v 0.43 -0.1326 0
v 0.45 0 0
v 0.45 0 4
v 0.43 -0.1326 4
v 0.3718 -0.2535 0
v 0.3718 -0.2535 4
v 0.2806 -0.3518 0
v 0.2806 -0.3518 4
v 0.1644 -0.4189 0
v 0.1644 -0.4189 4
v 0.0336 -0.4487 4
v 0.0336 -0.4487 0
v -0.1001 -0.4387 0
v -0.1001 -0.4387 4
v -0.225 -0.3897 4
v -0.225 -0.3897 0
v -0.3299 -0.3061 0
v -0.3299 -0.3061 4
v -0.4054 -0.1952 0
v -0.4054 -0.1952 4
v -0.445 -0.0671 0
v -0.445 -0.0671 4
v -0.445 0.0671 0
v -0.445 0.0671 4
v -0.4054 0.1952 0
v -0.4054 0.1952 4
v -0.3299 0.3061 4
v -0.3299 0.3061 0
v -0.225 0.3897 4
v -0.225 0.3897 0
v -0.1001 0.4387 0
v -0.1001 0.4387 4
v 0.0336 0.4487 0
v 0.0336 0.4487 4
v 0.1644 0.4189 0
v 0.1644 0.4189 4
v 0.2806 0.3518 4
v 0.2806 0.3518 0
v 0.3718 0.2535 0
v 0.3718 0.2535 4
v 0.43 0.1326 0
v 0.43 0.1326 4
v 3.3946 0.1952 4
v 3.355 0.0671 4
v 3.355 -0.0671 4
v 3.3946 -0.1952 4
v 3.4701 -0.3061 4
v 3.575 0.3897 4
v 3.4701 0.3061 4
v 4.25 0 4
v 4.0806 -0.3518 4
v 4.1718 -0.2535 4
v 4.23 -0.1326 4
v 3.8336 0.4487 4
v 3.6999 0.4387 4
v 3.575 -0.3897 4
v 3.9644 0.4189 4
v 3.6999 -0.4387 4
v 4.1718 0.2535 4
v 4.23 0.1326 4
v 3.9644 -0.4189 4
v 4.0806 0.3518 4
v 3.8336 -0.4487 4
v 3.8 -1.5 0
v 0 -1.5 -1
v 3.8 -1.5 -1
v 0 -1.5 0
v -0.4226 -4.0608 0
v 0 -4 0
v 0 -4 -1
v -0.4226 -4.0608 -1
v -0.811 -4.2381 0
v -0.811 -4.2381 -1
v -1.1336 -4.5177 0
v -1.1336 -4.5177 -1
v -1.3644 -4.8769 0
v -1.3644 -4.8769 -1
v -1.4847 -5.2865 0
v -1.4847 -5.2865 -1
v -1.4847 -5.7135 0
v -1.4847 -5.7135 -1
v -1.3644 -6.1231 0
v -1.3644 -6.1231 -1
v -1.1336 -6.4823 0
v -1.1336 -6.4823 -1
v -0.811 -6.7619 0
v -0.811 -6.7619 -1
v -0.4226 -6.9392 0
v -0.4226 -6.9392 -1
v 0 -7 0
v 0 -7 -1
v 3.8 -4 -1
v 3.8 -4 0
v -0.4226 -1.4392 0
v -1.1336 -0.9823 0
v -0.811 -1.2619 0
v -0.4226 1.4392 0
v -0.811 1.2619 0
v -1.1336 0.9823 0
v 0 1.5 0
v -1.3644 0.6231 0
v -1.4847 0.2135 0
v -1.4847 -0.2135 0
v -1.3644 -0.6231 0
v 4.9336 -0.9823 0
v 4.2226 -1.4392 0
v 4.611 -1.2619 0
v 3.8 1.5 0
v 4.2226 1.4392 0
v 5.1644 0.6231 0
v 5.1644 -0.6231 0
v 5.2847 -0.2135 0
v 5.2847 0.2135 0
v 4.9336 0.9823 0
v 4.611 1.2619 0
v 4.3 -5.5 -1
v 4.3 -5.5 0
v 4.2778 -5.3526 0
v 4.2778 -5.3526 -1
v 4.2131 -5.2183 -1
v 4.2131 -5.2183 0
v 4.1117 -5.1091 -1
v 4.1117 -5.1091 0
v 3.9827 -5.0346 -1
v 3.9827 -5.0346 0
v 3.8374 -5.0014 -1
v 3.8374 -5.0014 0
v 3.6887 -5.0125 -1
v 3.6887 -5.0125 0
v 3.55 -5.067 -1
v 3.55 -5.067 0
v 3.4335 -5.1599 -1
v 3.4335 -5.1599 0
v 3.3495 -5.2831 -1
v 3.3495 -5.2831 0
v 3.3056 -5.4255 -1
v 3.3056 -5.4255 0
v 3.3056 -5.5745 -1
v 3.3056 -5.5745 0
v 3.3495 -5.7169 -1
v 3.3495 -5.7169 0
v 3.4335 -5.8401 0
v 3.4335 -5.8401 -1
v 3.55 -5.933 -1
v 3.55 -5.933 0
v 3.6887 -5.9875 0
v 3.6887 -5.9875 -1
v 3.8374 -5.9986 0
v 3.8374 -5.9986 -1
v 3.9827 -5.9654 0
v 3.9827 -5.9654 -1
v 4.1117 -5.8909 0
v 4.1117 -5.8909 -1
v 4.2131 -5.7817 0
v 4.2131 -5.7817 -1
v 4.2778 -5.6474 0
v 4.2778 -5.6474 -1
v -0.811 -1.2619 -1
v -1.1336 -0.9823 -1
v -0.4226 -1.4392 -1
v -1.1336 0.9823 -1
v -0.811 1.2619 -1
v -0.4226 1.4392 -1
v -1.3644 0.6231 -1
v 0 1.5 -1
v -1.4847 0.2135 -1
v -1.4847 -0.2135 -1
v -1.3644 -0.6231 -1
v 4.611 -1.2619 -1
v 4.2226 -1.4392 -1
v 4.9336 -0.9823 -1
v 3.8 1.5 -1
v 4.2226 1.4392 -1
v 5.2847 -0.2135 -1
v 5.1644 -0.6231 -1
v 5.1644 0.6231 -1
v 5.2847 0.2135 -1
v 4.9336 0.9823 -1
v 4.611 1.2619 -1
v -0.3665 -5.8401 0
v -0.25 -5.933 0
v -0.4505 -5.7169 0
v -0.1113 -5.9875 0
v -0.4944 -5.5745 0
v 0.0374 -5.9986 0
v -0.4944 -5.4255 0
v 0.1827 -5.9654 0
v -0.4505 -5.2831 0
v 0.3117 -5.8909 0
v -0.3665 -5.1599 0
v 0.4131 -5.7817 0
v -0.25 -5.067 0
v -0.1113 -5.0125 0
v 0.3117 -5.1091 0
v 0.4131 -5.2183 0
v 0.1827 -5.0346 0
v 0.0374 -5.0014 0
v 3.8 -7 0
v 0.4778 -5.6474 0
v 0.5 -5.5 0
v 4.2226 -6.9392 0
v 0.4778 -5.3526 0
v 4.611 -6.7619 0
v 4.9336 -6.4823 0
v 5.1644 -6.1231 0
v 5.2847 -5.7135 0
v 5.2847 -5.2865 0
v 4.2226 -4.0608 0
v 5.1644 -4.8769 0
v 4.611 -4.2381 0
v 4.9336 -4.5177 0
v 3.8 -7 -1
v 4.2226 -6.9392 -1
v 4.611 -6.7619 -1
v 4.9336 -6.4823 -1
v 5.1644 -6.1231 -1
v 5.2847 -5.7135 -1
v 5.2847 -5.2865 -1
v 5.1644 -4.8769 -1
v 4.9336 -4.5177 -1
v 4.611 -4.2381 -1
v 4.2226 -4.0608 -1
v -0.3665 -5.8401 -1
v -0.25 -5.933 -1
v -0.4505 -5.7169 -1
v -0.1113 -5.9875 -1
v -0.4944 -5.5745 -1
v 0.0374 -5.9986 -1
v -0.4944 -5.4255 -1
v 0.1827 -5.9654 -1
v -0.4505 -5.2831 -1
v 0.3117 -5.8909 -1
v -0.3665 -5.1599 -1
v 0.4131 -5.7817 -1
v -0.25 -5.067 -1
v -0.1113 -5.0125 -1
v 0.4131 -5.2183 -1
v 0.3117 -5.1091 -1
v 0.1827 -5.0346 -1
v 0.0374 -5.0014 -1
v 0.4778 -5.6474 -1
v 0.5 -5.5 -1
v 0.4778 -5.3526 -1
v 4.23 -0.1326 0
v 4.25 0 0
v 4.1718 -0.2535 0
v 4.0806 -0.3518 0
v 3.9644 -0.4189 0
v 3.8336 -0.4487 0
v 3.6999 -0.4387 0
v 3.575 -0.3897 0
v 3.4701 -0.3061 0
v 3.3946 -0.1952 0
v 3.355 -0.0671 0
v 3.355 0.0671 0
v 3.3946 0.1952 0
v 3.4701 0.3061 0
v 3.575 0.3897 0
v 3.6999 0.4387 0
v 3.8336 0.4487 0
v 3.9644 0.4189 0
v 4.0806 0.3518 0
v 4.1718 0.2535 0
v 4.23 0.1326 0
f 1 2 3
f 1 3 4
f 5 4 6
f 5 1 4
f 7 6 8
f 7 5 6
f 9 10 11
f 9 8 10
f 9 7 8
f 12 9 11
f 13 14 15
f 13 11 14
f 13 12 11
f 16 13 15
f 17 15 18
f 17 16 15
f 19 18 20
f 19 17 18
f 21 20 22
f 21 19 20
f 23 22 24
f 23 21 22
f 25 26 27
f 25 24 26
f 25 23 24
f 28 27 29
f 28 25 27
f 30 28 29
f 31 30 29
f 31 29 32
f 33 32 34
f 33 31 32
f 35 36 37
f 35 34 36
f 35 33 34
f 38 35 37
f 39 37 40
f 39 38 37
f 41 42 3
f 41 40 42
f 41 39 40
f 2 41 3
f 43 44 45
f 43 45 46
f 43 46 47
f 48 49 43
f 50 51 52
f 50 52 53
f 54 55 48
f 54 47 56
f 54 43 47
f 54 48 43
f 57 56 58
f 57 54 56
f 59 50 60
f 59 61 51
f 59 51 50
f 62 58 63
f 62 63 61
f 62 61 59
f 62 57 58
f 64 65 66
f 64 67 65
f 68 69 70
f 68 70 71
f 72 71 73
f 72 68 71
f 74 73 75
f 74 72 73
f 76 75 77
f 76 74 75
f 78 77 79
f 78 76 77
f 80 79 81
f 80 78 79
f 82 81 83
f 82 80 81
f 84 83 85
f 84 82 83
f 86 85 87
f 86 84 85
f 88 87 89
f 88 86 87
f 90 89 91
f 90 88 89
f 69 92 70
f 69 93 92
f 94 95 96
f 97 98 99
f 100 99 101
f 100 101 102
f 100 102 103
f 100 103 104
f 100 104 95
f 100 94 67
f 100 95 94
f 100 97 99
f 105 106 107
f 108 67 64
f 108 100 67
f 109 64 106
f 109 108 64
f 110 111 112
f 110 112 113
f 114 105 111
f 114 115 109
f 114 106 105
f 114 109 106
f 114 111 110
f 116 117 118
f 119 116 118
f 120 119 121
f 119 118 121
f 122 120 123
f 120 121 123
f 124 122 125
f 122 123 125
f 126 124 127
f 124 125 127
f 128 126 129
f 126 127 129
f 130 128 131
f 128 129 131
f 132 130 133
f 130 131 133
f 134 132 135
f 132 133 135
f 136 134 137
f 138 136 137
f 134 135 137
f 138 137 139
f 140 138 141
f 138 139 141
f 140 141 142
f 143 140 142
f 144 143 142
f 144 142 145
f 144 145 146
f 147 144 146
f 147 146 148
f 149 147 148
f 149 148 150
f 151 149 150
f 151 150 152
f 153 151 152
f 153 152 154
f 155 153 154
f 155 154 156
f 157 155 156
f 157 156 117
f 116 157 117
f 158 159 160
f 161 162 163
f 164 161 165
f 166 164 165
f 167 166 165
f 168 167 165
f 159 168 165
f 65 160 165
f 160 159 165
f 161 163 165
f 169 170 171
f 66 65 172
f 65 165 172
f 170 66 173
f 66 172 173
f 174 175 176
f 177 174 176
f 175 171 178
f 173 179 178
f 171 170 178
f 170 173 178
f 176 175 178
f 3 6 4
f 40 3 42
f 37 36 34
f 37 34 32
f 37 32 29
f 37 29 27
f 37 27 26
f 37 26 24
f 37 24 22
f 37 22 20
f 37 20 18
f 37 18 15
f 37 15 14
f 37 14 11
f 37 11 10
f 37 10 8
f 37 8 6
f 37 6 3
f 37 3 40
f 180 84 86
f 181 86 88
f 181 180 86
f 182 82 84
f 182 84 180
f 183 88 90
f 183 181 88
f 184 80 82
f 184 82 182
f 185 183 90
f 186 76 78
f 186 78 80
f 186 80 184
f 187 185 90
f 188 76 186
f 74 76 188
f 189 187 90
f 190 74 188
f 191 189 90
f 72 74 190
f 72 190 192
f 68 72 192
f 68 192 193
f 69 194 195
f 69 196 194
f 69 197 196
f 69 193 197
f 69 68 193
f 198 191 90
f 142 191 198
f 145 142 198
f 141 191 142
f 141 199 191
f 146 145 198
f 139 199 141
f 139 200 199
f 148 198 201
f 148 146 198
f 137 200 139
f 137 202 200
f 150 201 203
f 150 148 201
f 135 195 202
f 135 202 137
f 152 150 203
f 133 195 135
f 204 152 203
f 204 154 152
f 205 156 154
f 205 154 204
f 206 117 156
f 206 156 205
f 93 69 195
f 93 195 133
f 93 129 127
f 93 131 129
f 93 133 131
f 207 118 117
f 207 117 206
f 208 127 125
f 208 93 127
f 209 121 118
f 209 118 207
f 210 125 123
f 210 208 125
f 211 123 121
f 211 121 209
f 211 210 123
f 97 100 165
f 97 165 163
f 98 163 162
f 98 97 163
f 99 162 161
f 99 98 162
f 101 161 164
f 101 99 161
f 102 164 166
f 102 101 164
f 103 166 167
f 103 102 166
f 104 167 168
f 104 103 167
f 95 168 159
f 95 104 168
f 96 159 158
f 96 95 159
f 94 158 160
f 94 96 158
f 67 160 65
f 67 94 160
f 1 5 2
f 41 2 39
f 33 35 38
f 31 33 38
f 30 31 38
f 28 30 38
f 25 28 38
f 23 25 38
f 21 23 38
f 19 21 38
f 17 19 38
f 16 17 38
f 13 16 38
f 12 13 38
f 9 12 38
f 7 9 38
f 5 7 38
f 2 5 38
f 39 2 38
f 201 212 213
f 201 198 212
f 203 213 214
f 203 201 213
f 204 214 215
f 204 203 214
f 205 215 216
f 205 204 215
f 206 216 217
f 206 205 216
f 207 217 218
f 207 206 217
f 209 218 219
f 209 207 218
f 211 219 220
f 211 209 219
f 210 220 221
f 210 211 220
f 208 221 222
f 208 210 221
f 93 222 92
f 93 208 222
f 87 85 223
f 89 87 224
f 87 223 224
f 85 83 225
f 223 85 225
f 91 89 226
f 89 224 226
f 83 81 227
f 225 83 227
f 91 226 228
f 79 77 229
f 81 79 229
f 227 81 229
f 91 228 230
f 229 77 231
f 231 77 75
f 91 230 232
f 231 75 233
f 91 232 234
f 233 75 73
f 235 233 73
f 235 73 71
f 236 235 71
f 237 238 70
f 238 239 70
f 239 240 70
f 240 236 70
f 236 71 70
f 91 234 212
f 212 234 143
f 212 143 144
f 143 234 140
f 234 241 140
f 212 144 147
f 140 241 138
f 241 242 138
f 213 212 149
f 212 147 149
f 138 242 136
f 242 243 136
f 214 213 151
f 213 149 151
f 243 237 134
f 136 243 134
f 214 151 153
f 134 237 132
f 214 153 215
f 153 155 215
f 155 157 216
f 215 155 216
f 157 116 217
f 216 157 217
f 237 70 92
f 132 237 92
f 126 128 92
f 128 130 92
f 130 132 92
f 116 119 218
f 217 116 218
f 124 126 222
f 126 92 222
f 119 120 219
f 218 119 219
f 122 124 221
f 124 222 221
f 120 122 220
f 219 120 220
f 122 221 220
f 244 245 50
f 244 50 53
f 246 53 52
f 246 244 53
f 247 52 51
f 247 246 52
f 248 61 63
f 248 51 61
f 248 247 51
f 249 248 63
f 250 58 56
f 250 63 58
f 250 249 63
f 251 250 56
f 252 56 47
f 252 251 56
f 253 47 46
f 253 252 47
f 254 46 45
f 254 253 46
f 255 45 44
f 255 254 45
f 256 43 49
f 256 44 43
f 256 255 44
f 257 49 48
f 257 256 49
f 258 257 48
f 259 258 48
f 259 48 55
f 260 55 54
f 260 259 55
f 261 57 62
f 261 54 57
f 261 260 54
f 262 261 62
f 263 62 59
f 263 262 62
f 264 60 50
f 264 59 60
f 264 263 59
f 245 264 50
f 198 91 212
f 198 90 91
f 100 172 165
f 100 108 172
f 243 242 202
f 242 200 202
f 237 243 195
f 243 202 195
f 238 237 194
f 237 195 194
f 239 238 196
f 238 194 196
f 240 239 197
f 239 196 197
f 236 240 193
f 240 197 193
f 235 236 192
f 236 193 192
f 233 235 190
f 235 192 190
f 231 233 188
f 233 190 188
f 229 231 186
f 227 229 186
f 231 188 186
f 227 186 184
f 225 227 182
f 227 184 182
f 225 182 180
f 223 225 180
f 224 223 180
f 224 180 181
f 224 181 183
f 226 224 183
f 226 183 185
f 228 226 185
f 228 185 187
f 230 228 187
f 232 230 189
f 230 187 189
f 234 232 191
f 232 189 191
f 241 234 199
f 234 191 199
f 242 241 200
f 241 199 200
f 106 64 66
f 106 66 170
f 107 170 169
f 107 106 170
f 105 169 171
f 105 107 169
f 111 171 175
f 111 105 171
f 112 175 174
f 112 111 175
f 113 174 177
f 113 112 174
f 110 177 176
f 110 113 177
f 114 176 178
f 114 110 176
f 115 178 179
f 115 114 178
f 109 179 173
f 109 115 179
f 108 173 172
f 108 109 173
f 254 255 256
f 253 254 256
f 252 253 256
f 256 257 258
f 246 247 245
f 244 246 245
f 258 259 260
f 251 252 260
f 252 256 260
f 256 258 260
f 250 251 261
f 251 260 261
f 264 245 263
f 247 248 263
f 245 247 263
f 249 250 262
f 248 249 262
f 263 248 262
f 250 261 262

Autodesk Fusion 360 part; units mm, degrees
sketch "Sketch1" plane through (0, 0, 0) normal (0, 0, 1) x (1, 0, 0)
  line L0 (0, -1.5) -> (3.8, -1.5)
  arc A0 (3.8, -1.5) -> (3.8, 1.5) centre (3.8, 0) ccw
  line L1 (3.8, 1.5) -> (0, 1.5)
  arc A1 (0, 1.5) -> (0, -1.5) centre (0, 0) ccw
  line L2 (0, 0) -> (3.8, 0) construction
  circle A2 centre (0, 0) radius 0.45
  circle A3 centre (3.8, 0) radius 0.45
  line L3 (0, -7) -> (3.8, -7)
  arc A4 (3.8, -7) -> (3.8, -4) centre (3.8, -5.5) ccw
  line L4 (3.8, -4) -> (0, -4)
  arc A5 (0, -4) -> (0, -7) centre (0, -5.5) ccw
  line L5 (0, -5.5) -> (3.8, -5.5) construction
  circle A6 centre (0, -5.5) radius 0.5
  circle A7 centre (3.8, -5.5) radius 0.5
  dimension "d1" = 3
  dimension "d2" = 0.9
  dimension "d3" = 0.9
  dimension "d8" = 3
  dimension "d9" = 1
  dimension "d10" = 1
extrude "Extrude1" add sketch "Sketch1" along normal blind 4 contours A2 | A3 makes body 1 at (0.4494, -0.0224, 2.6667) makes body 2 at (4.2494, -0.0224, 2.6667)
extrude "Extrude2" add sketch "Sketch1" against normal blind 1 separate body contours L0 A0 L1 A1 | A2 | A3 makes body 3
extrude "Extrude3" add sketch "Sketch1" against normal blind 1 separate body contours L3 A4 L4 A5 makes body 4
